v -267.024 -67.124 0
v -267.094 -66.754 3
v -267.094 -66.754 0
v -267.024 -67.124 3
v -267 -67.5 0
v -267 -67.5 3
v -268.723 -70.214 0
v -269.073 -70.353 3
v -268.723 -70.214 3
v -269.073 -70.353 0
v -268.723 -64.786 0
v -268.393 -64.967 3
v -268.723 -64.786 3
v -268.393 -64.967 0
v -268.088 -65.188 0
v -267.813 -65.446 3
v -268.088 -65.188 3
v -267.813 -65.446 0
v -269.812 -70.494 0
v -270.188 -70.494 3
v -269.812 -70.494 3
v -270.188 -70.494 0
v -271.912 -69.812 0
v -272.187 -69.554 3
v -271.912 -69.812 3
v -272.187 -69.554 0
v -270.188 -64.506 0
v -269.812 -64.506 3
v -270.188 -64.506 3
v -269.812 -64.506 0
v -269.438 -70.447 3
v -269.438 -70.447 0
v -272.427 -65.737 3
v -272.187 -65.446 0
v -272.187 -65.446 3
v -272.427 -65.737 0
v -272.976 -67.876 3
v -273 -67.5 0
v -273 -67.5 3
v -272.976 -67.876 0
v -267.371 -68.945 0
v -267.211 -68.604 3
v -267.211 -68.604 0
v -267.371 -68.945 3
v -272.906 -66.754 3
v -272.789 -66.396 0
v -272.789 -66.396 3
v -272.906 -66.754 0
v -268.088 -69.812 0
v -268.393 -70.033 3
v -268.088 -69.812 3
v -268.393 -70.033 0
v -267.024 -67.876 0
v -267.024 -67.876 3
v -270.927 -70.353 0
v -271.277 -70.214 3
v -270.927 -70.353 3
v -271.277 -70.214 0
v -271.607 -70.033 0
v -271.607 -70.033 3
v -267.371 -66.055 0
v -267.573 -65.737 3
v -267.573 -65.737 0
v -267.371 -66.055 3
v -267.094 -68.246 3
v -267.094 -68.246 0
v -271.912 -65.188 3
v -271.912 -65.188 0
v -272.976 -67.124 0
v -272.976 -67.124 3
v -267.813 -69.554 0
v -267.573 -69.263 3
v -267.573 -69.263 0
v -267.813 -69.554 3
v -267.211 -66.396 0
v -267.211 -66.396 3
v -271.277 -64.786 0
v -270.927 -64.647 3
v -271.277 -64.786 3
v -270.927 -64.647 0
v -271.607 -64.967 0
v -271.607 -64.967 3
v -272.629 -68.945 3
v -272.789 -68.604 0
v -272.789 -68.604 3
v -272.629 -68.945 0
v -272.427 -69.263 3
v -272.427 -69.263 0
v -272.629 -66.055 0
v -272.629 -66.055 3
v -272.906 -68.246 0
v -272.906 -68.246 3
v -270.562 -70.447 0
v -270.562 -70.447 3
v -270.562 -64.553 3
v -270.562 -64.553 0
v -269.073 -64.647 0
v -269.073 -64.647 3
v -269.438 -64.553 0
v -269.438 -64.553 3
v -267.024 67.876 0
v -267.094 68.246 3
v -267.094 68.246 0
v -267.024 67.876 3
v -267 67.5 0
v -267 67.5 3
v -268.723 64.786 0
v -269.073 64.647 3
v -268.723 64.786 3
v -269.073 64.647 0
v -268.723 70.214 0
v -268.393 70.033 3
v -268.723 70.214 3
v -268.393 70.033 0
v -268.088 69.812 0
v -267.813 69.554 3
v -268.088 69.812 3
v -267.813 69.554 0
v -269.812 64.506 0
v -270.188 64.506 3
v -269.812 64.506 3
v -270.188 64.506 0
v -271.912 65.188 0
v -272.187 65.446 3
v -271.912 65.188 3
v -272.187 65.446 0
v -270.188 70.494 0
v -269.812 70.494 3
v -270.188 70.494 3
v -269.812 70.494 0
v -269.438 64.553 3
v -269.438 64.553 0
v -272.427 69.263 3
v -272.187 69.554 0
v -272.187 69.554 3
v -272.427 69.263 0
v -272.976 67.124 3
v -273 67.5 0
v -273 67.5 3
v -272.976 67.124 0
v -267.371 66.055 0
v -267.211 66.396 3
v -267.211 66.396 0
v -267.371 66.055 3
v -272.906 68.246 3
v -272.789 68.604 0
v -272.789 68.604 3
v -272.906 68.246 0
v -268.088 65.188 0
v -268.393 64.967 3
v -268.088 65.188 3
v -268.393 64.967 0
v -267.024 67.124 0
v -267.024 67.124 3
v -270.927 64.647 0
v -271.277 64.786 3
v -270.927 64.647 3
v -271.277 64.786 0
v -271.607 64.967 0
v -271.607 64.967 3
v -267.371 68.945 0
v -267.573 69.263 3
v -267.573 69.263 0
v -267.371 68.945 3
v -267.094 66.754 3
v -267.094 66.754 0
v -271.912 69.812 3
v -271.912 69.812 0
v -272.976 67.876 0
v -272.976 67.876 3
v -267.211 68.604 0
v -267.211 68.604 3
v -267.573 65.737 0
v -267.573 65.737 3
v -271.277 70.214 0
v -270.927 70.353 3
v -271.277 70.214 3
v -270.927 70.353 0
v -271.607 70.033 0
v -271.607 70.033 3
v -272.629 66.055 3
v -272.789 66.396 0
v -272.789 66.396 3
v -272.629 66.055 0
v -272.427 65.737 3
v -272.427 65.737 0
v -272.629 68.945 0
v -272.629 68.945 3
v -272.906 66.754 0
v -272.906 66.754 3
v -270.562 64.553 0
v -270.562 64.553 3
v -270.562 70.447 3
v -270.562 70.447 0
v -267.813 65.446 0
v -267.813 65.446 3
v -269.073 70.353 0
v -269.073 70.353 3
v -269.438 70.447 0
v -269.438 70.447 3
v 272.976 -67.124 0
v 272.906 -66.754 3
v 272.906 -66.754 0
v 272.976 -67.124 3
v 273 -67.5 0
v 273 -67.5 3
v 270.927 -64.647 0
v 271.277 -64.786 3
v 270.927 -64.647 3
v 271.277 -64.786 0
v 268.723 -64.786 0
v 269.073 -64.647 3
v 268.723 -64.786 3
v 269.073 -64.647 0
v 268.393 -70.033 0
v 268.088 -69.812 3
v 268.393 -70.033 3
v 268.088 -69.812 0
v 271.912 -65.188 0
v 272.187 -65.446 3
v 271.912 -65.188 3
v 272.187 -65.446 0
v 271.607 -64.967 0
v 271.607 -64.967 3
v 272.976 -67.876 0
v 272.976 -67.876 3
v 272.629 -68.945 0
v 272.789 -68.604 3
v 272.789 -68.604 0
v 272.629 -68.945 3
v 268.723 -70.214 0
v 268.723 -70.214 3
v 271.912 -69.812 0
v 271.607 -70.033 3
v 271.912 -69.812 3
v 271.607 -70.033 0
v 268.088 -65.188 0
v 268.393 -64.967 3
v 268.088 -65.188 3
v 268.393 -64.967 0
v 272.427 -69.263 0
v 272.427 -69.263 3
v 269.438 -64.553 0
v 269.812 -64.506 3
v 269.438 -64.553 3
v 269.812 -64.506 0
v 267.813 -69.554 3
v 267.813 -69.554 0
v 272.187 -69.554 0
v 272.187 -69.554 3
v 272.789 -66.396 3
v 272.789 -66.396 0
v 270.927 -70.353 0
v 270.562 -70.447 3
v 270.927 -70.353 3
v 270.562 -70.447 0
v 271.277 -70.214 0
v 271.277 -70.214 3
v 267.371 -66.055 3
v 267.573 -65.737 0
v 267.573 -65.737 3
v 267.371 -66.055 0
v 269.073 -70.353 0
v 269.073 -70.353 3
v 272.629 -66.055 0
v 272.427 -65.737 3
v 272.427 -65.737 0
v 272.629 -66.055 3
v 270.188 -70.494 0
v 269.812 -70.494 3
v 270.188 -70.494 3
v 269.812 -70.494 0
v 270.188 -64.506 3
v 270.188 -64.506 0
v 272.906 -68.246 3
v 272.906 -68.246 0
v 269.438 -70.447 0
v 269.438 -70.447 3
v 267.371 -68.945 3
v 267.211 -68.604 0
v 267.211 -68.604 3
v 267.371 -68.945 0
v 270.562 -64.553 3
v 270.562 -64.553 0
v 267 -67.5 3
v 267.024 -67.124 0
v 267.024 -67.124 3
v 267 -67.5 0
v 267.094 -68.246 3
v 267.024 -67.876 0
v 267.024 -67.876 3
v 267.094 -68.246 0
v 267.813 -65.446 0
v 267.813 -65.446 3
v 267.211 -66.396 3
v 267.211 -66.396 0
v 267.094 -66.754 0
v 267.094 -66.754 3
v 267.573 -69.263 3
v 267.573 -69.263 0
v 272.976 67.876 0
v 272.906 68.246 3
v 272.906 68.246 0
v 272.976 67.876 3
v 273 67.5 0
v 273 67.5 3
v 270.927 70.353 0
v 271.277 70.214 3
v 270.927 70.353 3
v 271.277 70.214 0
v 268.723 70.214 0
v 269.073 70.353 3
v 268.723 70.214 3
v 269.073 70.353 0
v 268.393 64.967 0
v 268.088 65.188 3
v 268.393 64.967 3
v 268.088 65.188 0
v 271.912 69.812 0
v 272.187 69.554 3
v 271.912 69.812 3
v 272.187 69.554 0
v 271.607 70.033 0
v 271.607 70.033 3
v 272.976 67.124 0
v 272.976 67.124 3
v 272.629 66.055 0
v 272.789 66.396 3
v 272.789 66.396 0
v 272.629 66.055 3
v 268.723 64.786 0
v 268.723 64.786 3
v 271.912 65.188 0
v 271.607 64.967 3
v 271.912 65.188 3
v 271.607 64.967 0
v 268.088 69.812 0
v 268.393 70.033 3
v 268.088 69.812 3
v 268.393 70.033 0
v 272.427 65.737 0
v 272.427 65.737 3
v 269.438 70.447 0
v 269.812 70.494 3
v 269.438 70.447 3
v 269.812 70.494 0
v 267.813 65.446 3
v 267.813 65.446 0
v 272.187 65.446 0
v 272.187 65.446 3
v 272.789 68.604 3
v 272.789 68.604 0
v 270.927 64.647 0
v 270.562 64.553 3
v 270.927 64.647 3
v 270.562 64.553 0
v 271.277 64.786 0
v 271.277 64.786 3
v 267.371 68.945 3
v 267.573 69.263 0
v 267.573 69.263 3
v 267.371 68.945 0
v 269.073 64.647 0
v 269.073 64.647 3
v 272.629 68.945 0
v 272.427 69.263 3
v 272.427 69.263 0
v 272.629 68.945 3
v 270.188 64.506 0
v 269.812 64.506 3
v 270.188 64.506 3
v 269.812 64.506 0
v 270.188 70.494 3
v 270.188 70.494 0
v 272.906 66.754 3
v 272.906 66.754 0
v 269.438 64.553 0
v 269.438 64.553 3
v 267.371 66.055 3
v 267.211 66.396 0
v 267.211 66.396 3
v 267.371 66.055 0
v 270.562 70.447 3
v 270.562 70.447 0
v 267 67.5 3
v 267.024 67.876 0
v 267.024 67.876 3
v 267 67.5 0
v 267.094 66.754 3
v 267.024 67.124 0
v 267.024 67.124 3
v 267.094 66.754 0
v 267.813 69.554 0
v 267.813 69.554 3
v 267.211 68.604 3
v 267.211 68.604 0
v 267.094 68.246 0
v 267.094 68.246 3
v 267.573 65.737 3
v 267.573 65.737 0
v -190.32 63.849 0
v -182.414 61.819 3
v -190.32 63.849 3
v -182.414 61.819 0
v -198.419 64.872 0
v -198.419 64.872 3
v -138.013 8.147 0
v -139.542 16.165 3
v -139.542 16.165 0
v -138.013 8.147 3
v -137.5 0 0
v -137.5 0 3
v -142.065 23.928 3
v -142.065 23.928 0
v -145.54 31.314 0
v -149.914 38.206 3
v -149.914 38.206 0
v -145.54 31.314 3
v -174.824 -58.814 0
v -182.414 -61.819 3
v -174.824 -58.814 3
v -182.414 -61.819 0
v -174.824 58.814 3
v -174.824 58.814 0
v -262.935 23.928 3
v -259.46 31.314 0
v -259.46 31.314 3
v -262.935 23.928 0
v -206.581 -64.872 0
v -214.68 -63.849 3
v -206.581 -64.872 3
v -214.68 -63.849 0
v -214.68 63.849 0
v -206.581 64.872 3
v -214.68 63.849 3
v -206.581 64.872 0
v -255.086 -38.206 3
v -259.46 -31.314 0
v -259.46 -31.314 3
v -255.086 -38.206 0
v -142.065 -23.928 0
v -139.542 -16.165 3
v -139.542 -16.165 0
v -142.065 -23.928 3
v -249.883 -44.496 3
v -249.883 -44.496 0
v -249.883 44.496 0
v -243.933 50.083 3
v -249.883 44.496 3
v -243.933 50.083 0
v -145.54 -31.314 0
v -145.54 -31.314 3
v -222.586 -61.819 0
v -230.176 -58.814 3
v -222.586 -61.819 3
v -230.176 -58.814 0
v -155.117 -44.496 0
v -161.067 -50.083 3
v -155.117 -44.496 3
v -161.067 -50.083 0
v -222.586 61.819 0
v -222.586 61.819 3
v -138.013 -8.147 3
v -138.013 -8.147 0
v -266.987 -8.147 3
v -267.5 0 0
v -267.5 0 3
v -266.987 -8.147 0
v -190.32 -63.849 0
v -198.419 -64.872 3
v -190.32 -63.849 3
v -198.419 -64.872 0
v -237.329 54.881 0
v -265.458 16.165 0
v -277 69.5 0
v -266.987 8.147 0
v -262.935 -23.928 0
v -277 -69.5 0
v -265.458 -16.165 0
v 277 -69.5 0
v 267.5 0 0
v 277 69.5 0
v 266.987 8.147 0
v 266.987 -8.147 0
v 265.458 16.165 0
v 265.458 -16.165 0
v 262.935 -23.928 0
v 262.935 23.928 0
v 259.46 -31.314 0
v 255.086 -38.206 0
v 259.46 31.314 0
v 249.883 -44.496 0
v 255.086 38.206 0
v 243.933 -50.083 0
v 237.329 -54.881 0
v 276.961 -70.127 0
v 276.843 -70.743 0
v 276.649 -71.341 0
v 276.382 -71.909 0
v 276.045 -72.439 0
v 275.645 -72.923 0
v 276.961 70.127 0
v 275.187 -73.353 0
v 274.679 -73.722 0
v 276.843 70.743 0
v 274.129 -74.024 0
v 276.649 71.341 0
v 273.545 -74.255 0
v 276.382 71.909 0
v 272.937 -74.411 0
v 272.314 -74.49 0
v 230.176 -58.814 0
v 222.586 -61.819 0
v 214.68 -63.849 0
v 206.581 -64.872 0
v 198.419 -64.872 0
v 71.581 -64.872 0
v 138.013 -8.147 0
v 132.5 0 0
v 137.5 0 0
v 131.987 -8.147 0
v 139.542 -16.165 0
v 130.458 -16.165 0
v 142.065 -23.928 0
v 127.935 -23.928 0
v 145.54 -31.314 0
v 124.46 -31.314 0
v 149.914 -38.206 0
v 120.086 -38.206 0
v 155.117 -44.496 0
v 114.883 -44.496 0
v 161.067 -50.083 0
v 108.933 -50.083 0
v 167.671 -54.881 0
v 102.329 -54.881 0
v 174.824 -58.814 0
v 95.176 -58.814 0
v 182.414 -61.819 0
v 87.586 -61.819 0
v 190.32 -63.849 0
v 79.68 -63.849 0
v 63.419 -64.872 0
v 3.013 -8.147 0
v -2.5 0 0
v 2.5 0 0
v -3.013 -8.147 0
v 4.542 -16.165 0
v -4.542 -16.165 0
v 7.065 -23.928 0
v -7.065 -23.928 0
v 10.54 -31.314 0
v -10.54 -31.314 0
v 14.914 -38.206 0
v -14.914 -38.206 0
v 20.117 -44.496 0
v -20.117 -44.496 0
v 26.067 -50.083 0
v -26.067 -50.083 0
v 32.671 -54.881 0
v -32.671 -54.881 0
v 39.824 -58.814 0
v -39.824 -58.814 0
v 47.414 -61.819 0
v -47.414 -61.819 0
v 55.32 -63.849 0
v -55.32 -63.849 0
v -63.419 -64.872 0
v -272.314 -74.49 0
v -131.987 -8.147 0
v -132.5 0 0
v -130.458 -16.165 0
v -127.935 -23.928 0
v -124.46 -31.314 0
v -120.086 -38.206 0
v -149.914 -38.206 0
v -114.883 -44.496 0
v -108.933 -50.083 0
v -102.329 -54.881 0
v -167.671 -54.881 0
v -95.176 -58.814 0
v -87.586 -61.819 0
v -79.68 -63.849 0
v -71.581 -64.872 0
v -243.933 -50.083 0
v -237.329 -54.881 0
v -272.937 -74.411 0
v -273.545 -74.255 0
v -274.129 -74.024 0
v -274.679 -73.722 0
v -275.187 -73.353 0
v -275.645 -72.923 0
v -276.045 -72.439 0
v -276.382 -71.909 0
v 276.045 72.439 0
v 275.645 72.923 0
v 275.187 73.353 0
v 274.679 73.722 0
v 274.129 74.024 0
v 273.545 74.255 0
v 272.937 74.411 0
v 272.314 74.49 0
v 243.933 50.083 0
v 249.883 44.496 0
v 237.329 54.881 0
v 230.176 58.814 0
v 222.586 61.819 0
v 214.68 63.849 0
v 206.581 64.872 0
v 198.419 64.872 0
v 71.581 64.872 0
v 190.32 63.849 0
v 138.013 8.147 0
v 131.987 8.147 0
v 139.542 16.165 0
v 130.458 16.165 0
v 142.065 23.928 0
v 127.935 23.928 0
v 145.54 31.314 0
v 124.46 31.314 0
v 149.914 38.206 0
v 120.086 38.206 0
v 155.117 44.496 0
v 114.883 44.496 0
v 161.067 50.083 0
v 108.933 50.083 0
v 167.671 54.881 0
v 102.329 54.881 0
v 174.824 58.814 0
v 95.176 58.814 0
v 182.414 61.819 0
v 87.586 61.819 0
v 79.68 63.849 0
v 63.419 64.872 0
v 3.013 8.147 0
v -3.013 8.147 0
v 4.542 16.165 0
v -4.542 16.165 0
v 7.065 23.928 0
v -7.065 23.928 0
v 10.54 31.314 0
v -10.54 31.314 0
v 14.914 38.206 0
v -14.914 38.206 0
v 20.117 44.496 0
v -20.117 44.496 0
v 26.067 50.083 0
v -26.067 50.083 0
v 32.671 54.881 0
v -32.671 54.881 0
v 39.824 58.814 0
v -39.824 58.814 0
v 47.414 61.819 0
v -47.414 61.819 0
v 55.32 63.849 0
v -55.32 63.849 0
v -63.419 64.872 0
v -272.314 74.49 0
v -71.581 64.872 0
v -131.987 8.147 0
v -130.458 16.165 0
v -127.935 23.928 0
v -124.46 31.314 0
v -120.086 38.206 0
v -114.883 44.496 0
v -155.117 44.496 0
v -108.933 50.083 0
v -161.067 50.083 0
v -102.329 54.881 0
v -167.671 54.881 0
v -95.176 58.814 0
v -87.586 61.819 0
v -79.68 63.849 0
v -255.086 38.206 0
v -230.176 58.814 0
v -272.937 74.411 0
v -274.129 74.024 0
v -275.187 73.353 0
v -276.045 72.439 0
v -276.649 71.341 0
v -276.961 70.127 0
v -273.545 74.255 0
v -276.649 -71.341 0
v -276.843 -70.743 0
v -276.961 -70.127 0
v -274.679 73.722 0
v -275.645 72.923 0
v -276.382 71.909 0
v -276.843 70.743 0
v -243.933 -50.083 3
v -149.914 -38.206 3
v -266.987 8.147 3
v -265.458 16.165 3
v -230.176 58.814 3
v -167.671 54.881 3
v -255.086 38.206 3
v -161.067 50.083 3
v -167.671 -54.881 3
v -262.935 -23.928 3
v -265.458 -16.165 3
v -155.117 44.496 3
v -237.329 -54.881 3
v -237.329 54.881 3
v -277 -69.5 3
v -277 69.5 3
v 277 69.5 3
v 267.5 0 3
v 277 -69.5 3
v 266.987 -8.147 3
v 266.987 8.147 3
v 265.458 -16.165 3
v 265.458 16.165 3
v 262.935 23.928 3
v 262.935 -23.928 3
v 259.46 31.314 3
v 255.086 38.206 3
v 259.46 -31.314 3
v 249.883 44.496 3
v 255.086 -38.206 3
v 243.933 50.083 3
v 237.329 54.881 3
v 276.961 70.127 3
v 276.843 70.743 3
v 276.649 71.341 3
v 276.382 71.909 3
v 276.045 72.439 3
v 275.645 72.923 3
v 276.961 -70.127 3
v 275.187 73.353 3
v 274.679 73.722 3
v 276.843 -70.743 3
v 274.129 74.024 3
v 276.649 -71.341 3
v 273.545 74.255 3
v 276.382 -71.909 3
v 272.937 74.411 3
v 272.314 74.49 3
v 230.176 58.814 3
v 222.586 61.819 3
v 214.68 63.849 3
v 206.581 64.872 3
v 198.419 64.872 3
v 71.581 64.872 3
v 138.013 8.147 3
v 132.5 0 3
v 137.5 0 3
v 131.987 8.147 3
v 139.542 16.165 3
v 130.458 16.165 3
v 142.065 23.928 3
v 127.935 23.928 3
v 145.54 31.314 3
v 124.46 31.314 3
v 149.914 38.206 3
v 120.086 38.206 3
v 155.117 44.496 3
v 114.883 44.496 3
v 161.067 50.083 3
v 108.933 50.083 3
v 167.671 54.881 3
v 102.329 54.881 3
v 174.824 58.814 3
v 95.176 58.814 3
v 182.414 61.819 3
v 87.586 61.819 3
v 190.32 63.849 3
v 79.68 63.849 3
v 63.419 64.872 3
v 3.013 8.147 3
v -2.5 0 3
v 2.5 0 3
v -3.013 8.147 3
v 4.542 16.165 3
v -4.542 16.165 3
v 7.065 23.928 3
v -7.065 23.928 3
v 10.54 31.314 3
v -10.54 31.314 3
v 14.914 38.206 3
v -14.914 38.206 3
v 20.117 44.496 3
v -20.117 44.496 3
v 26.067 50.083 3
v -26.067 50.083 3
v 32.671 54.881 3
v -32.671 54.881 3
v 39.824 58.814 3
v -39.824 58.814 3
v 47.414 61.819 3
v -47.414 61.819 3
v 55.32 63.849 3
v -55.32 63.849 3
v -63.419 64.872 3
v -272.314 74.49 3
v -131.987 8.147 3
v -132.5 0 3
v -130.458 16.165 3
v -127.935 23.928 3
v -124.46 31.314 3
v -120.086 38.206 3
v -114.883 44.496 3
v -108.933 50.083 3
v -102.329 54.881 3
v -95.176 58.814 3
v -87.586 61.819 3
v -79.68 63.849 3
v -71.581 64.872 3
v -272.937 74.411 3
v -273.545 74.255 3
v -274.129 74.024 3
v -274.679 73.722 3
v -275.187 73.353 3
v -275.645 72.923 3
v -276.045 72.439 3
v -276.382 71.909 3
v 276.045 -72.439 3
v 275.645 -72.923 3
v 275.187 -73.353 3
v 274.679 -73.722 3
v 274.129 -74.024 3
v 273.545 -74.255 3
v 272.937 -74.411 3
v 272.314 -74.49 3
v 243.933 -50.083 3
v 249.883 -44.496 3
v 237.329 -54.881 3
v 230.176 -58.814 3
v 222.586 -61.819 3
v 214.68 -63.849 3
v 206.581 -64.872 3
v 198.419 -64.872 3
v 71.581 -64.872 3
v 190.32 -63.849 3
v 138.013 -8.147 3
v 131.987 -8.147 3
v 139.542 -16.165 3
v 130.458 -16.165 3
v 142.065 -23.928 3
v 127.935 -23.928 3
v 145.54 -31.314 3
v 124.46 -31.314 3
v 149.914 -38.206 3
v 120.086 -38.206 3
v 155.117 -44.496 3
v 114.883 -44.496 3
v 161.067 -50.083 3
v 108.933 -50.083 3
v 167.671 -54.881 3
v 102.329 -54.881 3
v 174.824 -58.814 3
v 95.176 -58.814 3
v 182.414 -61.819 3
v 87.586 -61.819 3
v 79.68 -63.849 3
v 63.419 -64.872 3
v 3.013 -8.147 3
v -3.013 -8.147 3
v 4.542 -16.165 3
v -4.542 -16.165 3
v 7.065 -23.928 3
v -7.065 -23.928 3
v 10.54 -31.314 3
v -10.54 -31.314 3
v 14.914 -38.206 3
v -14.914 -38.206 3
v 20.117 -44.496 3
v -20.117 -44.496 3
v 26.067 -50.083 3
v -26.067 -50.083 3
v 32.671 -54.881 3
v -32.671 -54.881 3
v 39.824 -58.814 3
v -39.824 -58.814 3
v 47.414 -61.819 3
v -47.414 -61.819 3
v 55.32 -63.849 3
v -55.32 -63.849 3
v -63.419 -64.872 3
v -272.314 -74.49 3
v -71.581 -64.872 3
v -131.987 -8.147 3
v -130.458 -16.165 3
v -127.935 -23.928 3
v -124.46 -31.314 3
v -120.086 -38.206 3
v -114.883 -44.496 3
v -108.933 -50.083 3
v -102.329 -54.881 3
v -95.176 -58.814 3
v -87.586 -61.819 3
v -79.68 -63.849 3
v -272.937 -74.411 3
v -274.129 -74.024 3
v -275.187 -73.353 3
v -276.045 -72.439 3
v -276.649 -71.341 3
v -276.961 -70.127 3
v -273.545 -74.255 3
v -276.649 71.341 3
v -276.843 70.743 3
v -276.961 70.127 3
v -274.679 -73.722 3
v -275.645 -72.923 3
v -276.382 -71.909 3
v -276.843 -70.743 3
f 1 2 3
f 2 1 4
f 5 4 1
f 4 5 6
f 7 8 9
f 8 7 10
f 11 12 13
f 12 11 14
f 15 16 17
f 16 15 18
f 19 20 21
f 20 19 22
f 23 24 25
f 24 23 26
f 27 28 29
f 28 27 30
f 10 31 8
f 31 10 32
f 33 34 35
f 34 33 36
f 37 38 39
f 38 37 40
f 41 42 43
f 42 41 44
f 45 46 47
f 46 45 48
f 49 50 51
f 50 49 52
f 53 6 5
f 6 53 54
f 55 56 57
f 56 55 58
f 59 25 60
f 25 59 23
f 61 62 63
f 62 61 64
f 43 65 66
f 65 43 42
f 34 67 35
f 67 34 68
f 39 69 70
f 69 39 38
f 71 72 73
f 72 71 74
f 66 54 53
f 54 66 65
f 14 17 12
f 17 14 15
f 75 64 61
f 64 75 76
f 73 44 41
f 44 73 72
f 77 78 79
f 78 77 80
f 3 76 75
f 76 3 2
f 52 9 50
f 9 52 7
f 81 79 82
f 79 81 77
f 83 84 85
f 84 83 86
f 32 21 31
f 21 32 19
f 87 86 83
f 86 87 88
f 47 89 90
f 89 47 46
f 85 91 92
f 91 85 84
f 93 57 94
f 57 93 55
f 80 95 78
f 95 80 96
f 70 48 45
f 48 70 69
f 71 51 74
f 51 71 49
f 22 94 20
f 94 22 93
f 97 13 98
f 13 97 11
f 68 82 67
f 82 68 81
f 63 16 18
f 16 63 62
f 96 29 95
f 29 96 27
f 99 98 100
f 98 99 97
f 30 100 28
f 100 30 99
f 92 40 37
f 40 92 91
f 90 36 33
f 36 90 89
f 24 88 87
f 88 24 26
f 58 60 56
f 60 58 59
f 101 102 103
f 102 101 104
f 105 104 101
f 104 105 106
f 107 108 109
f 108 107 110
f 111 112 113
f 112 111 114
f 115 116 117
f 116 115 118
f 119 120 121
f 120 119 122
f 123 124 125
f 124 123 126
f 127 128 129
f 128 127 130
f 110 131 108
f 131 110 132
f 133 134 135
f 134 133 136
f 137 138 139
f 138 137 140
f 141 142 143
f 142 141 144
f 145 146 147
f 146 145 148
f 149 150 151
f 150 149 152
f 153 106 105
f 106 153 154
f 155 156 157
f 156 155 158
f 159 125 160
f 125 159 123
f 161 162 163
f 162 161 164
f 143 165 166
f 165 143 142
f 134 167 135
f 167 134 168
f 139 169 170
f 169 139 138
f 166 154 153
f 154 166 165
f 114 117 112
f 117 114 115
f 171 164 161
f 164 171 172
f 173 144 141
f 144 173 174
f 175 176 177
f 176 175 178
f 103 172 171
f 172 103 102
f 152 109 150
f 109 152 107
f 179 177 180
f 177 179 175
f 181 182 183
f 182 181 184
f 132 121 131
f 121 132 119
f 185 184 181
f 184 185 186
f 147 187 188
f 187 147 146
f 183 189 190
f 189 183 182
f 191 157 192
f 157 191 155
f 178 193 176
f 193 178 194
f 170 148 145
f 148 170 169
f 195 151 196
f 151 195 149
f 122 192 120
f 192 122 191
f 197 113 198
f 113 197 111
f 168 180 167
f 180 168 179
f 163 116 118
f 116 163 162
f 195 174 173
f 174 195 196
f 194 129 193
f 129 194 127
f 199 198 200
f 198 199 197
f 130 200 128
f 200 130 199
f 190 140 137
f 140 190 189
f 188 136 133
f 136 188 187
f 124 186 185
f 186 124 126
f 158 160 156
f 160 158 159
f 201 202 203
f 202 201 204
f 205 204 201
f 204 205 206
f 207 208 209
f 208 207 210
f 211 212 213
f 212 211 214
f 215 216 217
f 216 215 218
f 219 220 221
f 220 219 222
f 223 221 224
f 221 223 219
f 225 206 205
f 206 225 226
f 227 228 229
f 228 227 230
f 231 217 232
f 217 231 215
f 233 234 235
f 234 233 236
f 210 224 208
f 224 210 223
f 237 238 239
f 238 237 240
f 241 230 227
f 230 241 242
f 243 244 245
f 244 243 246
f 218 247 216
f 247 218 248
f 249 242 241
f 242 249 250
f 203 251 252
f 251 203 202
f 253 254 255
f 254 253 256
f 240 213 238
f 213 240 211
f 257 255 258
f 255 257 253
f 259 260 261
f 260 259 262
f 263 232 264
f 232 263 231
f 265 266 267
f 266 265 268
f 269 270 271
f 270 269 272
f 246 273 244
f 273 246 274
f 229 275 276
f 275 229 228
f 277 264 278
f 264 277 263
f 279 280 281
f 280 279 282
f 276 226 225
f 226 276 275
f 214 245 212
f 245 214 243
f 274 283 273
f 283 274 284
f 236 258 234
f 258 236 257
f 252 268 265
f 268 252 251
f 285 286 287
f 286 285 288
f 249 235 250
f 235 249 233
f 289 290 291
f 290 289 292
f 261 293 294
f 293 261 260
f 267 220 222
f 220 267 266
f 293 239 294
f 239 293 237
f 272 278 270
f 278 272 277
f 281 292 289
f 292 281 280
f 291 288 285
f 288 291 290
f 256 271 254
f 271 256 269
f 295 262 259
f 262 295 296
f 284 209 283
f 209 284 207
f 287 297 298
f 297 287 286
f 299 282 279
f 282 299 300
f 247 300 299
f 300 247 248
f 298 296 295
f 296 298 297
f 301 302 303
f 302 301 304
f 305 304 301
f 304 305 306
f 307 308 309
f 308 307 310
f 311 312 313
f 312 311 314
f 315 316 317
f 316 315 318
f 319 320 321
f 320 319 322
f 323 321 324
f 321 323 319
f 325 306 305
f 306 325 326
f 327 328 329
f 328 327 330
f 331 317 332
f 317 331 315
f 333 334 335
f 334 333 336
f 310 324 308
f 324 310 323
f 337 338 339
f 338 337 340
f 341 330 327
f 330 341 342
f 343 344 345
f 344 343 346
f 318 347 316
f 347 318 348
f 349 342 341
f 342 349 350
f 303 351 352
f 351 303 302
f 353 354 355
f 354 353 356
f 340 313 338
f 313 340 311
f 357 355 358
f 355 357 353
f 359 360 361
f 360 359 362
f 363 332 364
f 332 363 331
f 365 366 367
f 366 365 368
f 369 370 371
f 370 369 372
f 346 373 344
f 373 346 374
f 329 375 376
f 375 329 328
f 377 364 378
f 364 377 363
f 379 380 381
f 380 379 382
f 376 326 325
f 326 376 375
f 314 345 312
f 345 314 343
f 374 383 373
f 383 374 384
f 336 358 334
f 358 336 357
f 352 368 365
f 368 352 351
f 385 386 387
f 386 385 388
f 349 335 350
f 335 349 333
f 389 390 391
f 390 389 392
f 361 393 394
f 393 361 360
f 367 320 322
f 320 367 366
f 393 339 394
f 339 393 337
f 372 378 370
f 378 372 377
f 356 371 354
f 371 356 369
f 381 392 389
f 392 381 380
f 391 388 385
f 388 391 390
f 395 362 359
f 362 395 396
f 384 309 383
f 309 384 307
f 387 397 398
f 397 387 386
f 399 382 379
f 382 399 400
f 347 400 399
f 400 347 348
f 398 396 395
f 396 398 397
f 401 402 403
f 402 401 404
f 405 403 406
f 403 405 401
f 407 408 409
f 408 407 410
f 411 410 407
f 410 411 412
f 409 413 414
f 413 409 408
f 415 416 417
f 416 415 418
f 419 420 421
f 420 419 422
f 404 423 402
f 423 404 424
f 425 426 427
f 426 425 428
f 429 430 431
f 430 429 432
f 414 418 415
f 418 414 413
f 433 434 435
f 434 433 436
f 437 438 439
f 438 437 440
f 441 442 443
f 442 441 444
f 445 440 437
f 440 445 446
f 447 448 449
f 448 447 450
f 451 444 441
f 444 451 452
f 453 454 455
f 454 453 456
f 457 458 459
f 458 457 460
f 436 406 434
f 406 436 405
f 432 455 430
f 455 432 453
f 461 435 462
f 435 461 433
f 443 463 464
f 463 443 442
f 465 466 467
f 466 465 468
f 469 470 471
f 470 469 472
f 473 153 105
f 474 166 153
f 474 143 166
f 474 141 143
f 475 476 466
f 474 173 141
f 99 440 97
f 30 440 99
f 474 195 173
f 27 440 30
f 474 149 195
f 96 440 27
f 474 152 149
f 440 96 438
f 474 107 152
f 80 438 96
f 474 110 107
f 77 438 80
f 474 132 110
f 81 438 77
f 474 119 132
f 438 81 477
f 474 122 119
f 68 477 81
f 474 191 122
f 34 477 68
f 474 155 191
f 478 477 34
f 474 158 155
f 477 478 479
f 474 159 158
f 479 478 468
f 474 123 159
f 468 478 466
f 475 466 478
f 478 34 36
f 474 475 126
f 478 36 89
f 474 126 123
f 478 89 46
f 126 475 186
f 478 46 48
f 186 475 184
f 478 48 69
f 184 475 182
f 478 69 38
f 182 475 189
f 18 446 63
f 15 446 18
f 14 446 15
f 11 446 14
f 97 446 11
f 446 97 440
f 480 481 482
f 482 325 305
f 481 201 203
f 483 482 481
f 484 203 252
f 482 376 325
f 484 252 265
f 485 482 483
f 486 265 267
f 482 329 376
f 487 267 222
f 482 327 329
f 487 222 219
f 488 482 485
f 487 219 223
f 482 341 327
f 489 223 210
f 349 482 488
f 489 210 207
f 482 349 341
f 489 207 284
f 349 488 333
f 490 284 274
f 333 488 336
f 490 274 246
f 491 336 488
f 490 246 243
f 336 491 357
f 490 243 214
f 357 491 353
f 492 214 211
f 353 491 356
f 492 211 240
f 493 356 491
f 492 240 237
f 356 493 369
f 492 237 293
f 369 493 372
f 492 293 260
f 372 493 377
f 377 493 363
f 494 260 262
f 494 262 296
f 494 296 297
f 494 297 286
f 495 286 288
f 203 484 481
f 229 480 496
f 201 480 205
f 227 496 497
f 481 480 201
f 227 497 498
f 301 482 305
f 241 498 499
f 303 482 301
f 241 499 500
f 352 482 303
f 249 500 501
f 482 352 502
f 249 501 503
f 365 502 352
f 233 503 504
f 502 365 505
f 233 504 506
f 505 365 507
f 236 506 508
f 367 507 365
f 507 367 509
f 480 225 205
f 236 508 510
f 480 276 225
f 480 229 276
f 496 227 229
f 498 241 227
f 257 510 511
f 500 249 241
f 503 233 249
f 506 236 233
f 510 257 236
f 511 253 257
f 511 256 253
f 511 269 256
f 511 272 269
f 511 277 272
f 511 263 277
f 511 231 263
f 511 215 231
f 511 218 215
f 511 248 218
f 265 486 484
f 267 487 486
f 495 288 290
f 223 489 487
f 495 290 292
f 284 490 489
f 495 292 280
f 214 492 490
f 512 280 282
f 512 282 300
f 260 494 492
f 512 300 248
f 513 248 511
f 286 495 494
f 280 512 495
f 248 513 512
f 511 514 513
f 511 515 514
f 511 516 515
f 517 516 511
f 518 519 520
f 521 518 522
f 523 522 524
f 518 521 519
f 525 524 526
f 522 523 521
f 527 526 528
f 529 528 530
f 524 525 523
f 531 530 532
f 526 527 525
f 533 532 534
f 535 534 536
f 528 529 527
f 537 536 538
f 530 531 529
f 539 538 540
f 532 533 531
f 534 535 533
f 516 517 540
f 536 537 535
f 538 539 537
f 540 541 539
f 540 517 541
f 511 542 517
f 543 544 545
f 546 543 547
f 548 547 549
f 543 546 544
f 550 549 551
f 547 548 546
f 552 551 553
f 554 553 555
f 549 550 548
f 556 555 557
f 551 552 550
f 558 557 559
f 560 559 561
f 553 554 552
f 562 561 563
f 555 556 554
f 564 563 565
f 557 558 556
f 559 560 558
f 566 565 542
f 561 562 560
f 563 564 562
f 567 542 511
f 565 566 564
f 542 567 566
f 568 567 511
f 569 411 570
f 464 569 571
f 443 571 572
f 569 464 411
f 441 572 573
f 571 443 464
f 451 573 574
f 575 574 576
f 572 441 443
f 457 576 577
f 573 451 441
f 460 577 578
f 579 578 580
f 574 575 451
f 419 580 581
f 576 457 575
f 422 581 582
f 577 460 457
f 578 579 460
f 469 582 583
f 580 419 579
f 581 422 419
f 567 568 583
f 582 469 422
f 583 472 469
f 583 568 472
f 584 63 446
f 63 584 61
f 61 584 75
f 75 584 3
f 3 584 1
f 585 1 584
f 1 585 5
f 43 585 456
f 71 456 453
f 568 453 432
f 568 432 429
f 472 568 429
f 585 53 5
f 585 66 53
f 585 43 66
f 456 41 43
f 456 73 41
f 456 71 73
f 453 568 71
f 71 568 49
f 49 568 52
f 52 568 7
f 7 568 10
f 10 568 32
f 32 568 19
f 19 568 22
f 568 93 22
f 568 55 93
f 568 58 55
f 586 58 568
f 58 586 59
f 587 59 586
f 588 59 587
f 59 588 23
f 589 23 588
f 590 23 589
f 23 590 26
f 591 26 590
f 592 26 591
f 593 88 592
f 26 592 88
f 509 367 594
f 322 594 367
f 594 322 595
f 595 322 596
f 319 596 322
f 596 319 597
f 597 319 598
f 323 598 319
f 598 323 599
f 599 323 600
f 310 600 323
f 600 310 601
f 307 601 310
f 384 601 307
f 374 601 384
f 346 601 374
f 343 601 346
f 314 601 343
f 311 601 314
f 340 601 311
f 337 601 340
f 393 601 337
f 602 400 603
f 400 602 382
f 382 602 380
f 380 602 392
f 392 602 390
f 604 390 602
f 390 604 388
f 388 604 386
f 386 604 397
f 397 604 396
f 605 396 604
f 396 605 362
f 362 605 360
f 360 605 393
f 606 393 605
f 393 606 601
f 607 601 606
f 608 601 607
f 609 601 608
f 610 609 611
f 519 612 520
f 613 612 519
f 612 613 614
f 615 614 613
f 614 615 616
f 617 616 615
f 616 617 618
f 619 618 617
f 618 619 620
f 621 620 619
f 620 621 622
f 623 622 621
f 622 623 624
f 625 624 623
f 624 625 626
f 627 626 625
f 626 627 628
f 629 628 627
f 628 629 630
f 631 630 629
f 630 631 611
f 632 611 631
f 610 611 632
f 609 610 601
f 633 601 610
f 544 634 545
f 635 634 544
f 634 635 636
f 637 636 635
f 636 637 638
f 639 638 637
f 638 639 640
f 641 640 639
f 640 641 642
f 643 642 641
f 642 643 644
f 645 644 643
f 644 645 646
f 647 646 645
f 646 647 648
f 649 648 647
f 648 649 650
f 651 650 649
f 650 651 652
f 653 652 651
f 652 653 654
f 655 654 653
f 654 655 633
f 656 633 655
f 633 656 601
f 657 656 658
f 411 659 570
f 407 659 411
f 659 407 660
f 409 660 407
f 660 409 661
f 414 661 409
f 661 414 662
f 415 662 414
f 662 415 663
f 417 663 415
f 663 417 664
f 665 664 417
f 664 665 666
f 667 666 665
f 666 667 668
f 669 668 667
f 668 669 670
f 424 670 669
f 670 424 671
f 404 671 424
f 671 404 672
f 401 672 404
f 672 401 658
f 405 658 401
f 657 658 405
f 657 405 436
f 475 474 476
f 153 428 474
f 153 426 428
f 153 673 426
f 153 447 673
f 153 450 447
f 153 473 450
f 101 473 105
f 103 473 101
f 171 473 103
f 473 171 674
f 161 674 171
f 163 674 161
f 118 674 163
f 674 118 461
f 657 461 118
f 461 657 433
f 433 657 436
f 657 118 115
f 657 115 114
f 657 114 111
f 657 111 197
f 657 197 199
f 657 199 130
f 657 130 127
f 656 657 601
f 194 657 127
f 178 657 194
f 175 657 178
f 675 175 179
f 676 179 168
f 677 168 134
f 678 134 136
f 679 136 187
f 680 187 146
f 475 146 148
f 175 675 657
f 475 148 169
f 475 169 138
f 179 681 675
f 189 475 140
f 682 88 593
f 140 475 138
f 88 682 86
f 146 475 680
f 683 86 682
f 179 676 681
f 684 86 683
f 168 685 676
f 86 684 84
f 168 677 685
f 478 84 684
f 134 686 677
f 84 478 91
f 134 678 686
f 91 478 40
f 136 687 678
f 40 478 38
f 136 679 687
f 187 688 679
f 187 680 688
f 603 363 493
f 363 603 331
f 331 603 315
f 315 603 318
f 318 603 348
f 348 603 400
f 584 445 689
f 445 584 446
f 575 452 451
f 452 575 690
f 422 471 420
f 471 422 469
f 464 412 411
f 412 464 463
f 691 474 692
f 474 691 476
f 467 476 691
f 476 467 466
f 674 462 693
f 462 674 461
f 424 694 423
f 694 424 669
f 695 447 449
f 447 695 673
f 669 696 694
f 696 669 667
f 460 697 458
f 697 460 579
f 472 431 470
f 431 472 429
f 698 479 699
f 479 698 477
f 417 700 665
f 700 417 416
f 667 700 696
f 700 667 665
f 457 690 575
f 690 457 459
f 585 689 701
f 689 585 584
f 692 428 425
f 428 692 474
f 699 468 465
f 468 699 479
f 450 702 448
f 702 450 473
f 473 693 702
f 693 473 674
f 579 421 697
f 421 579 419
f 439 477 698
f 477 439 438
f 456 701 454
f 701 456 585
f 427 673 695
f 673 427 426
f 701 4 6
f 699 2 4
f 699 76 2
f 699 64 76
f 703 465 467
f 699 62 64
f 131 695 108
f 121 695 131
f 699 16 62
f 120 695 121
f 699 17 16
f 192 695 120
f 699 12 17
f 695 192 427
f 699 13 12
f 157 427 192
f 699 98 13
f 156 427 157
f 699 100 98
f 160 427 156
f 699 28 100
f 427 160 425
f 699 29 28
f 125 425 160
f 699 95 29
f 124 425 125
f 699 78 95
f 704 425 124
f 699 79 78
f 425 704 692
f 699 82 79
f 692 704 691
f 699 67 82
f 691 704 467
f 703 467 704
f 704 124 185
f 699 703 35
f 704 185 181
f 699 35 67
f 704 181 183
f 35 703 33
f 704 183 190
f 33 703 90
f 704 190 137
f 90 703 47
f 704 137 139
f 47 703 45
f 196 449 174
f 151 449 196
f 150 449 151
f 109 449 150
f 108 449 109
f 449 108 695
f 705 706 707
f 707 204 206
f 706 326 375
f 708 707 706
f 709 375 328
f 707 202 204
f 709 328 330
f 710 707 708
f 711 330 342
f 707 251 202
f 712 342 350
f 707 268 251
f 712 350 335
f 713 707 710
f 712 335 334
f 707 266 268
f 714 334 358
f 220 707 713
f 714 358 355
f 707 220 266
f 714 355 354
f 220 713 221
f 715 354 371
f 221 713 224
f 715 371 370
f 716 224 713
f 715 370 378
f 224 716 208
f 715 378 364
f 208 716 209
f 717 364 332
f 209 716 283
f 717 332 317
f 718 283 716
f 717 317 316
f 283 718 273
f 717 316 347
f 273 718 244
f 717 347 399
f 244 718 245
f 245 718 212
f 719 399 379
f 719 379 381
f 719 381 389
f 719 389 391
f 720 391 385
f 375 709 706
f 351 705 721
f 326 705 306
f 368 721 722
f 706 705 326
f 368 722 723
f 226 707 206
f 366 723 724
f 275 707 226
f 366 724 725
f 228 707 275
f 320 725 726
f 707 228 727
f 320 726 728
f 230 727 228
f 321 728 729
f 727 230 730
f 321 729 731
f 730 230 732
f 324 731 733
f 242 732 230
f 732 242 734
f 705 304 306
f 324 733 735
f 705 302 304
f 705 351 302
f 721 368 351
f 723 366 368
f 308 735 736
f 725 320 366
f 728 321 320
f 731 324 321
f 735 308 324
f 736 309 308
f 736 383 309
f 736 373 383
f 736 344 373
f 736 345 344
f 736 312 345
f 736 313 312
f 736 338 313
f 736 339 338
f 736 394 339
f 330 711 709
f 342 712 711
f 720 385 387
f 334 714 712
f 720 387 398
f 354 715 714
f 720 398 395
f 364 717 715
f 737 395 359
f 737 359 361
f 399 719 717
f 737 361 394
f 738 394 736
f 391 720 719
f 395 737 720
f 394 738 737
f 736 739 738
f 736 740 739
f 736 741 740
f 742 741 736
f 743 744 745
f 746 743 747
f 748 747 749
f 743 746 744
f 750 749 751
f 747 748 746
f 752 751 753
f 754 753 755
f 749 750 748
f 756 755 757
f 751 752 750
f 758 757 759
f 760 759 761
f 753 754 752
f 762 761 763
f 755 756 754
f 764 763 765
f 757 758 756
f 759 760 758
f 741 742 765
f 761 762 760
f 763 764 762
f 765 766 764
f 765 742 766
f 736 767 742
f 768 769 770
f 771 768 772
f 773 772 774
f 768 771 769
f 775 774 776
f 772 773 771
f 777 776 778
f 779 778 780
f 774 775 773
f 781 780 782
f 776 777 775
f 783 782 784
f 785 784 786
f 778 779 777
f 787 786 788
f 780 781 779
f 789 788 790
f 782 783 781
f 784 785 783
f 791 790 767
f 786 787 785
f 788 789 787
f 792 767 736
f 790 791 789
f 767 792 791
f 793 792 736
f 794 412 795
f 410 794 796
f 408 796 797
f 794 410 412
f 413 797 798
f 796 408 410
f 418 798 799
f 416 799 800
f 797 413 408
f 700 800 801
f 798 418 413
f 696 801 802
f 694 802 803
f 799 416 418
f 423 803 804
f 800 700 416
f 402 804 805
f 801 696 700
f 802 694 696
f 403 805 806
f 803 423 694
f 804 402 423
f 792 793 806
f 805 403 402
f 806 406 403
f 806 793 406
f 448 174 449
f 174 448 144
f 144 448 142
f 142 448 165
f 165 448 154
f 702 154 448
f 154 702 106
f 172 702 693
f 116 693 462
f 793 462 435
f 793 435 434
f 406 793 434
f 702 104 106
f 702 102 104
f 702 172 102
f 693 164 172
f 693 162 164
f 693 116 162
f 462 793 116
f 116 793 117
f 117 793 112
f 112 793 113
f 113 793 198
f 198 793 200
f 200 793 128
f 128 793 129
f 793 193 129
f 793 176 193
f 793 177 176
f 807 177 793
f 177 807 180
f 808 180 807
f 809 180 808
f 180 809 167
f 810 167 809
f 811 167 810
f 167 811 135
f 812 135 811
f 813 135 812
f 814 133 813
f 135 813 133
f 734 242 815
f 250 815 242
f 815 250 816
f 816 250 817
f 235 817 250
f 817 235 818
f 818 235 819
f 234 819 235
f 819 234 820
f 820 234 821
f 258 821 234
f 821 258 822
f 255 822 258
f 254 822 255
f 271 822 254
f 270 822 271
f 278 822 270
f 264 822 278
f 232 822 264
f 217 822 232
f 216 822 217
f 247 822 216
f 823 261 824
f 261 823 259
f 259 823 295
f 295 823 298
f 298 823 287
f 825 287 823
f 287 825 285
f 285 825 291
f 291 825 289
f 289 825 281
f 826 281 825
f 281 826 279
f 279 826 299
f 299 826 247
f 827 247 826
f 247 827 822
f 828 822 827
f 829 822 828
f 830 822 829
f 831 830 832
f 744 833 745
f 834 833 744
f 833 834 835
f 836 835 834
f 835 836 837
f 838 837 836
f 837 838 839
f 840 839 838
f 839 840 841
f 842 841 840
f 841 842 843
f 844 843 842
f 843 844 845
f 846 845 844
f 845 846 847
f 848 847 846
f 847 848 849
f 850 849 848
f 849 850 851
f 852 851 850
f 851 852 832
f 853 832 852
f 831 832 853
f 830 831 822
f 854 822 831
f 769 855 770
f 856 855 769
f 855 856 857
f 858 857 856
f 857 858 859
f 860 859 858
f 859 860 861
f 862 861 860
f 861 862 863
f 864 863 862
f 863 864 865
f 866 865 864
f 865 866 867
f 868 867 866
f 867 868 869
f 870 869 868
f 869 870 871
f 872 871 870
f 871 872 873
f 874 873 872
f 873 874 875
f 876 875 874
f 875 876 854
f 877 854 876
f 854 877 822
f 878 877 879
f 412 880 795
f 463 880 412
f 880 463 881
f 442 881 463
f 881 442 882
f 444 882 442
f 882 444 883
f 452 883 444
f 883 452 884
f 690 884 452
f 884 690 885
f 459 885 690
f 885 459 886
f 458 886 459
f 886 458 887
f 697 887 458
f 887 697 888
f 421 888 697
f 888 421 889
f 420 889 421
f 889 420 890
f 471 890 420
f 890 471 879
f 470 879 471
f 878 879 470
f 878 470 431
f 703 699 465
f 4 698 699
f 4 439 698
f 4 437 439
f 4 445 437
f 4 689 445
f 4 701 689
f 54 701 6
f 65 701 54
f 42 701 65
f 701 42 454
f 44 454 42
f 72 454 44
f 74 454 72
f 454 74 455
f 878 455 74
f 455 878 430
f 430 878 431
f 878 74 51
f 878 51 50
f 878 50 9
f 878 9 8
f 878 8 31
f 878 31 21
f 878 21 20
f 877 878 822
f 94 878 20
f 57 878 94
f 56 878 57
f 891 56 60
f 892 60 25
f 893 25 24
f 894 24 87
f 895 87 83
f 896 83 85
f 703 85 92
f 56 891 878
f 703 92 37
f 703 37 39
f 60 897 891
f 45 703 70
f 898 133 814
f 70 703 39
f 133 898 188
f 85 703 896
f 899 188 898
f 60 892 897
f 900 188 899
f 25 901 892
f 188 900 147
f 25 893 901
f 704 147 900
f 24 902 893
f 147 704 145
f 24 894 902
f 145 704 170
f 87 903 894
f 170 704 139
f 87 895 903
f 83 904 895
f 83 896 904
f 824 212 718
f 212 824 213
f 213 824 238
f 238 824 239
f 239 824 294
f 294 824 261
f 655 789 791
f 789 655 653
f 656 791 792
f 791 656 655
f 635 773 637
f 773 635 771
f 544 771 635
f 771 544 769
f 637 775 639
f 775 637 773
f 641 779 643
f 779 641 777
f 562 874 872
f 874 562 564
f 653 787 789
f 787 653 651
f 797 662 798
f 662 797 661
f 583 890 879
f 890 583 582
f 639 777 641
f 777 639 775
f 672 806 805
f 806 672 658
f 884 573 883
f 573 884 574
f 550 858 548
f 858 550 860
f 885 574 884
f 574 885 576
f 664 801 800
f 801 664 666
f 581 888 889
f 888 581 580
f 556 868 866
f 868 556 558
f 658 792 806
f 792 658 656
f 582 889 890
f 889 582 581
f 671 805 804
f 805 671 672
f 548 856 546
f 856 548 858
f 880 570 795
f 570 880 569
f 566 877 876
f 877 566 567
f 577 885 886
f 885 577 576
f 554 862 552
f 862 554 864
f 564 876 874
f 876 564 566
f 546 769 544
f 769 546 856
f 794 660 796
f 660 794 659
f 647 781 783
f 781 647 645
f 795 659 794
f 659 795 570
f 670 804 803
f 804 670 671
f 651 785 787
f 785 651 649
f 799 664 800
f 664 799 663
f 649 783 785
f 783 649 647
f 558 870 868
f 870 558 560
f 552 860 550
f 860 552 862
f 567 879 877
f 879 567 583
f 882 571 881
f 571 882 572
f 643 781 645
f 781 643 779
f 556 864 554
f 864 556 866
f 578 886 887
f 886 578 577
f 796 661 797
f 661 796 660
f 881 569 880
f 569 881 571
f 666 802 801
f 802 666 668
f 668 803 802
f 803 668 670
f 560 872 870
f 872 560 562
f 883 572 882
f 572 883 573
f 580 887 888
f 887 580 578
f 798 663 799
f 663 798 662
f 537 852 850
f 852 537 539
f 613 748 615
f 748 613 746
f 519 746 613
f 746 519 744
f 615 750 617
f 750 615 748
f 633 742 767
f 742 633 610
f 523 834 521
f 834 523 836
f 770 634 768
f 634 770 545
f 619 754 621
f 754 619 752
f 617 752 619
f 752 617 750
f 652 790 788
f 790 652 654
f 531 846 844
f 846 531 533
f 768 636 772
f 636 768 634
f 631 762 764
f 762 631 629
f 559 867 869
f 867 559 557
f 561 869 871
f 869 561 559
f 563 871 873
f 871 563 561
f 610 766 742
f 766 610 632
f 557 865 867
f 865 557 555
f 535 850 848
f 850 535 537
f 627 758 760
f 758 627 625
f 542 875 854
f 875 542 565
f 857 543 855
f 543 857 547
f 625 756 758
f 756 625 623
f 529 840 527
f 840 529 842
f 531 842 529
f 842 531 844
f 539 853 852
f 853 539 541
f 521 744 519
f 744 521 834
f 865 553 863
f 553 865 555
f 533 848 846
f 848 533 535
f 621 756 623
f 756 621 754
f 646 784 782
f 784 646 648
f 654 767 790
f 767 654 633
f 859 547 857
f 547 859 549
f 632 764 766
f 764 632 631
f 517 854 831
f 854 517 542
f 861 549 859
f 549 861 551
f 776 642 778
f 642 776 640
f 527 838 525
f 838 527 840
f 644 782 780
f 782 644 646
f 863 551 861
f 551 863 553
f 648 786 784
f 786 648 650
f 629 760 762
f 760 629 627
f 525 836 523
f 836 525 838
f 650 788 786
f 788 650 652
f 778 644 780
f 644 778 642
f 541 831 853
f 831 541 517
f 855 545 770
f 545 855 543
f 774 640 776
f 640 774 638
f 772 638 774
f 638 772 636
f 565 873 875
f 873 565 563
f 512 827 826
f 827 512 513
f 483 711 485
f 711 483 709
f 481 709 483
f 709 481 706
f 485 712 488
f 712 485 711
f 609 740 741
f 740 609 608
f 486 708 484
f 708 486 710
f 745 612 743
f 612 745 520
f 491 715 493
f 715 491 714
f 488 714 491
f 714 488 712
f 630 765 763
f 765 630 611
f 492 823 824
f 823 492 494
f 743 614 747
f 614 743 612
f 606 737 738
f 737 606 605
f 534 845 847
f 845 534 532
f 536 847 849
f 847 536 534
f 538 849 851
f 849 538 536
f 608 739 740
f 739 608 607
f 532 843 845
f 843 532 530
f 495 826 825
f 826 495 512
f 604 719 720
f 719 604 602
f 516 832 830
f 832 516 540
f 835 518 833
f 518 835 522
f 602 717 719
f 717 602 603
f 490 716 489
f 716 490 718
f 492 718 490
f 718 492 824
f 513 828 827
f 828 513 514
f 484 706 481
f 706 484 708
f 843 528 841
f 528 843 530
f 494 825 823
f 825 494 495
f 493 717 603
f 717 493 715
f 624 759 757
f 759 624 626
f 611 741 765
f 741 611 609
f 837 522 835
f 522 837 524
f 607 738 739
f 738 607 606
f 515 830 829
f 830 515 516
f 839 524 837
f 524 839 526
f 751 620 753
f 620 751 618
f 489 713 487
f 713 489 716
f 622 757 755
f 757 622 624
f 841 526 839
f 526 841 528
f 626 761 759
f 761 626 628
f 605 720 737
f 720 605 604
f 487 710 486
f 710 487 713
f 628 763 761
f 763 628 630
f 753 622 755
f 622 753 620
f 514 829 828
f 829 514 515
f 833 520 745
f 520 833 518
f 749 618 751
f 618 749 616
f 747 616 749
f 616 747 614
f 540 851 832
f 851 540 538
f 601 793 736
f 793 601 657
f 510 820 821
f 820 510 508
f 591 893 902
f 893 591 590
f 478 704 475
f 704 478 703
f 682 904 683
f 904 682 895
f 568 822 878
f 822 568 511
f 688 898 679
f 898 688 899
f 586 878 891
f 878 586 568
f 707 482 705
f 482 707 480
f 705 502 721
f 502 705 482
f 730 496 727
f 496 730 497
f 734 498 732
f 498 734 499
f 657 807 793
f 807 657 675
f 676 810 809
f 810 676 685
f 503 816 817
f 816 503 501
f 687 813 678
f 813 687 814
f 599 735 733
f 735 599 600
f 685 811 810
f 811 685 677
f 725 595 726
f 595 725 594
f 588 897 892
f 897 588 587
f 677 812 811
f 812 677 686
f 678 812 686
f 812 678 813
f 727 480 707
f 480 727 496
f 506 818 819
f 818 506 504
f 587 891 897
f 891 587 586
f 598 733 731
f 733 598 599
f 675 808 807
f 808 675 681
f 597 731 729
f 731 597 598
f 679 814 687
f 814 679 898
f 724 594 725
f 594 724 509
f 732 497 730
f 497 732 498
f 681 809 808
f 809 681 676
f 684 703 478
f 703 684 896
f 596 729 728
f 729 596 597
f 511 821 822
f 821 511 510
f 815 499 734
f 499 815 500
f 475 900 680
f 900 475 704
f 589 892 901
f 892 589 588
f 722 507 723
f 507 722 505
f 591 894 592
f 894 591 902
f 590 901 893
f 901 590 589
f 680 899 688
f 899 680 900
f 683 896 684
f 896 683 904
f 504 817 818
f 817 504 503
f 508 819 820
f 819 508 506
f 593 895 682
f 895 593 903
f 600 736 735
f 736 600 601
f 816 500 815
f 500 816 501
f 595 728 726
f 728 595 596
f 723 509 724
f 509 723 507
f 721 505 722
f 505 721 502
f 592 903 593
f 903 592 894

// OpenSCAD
$fn = 50;


difference() {
	union() {
		hull() {
			translate(v = [-272.0000000000, 69.5000000000, 0]) {
				cylinder(h = 3, r = 5);
			}
			translate(v = [272.0000000000, 69.5000000000, 0]) {
				cylinder(h = 3, r = 5);
			}
			translate(v = [-272.0000000000, -69.5000000000, 0]) {
				cylinder(h = 3, r = 5);
			}
			translate(v = [272.0000000000, -69.5000000000, 0]) {
				cylinder(h = 3, r = 5);
			}
		}
	}
	union() {
		#translate(v = [-270.0000000000, -67.5000000000, -100.0000000000]) {
			cylinder(h = 200, r = 3.0000000000);
		}
		#translate(v = [-270.0000000000, 67.5000000000, -100.0000000000]) {
			cylinder(h = 200, r = 3.0000000000);
		}
		#translate(v = [270.0000000000, -67.5000000000, -100.0000000000]) {
			cylinder(h = 200, r = 3.0000000000);
		}
		#translate(v = [270.0000000000, 67.5000000000, -100.0000000000]) {
			cylinder(h = 200, r = 3.0000000000);
		}
		#translate(v = [-202.5000000000, 0, 0]) {
			cylinder(h = 3, r = 65.0000000000);
		}
		#translate(v = [-67.5000000000, 0, 0]) {
			cylinder(h = 3, r = 65.0000000000);
		}
		#translate(v = [67.5000000000, 0, 0]) {
			cylinder(h = 3, r = 65.0000000000);
		}
		#translate(v = [202.5000000000, 0, 0]) {
			cylinder(h = 3, r = 65.0000000000);
		}
	}
}
